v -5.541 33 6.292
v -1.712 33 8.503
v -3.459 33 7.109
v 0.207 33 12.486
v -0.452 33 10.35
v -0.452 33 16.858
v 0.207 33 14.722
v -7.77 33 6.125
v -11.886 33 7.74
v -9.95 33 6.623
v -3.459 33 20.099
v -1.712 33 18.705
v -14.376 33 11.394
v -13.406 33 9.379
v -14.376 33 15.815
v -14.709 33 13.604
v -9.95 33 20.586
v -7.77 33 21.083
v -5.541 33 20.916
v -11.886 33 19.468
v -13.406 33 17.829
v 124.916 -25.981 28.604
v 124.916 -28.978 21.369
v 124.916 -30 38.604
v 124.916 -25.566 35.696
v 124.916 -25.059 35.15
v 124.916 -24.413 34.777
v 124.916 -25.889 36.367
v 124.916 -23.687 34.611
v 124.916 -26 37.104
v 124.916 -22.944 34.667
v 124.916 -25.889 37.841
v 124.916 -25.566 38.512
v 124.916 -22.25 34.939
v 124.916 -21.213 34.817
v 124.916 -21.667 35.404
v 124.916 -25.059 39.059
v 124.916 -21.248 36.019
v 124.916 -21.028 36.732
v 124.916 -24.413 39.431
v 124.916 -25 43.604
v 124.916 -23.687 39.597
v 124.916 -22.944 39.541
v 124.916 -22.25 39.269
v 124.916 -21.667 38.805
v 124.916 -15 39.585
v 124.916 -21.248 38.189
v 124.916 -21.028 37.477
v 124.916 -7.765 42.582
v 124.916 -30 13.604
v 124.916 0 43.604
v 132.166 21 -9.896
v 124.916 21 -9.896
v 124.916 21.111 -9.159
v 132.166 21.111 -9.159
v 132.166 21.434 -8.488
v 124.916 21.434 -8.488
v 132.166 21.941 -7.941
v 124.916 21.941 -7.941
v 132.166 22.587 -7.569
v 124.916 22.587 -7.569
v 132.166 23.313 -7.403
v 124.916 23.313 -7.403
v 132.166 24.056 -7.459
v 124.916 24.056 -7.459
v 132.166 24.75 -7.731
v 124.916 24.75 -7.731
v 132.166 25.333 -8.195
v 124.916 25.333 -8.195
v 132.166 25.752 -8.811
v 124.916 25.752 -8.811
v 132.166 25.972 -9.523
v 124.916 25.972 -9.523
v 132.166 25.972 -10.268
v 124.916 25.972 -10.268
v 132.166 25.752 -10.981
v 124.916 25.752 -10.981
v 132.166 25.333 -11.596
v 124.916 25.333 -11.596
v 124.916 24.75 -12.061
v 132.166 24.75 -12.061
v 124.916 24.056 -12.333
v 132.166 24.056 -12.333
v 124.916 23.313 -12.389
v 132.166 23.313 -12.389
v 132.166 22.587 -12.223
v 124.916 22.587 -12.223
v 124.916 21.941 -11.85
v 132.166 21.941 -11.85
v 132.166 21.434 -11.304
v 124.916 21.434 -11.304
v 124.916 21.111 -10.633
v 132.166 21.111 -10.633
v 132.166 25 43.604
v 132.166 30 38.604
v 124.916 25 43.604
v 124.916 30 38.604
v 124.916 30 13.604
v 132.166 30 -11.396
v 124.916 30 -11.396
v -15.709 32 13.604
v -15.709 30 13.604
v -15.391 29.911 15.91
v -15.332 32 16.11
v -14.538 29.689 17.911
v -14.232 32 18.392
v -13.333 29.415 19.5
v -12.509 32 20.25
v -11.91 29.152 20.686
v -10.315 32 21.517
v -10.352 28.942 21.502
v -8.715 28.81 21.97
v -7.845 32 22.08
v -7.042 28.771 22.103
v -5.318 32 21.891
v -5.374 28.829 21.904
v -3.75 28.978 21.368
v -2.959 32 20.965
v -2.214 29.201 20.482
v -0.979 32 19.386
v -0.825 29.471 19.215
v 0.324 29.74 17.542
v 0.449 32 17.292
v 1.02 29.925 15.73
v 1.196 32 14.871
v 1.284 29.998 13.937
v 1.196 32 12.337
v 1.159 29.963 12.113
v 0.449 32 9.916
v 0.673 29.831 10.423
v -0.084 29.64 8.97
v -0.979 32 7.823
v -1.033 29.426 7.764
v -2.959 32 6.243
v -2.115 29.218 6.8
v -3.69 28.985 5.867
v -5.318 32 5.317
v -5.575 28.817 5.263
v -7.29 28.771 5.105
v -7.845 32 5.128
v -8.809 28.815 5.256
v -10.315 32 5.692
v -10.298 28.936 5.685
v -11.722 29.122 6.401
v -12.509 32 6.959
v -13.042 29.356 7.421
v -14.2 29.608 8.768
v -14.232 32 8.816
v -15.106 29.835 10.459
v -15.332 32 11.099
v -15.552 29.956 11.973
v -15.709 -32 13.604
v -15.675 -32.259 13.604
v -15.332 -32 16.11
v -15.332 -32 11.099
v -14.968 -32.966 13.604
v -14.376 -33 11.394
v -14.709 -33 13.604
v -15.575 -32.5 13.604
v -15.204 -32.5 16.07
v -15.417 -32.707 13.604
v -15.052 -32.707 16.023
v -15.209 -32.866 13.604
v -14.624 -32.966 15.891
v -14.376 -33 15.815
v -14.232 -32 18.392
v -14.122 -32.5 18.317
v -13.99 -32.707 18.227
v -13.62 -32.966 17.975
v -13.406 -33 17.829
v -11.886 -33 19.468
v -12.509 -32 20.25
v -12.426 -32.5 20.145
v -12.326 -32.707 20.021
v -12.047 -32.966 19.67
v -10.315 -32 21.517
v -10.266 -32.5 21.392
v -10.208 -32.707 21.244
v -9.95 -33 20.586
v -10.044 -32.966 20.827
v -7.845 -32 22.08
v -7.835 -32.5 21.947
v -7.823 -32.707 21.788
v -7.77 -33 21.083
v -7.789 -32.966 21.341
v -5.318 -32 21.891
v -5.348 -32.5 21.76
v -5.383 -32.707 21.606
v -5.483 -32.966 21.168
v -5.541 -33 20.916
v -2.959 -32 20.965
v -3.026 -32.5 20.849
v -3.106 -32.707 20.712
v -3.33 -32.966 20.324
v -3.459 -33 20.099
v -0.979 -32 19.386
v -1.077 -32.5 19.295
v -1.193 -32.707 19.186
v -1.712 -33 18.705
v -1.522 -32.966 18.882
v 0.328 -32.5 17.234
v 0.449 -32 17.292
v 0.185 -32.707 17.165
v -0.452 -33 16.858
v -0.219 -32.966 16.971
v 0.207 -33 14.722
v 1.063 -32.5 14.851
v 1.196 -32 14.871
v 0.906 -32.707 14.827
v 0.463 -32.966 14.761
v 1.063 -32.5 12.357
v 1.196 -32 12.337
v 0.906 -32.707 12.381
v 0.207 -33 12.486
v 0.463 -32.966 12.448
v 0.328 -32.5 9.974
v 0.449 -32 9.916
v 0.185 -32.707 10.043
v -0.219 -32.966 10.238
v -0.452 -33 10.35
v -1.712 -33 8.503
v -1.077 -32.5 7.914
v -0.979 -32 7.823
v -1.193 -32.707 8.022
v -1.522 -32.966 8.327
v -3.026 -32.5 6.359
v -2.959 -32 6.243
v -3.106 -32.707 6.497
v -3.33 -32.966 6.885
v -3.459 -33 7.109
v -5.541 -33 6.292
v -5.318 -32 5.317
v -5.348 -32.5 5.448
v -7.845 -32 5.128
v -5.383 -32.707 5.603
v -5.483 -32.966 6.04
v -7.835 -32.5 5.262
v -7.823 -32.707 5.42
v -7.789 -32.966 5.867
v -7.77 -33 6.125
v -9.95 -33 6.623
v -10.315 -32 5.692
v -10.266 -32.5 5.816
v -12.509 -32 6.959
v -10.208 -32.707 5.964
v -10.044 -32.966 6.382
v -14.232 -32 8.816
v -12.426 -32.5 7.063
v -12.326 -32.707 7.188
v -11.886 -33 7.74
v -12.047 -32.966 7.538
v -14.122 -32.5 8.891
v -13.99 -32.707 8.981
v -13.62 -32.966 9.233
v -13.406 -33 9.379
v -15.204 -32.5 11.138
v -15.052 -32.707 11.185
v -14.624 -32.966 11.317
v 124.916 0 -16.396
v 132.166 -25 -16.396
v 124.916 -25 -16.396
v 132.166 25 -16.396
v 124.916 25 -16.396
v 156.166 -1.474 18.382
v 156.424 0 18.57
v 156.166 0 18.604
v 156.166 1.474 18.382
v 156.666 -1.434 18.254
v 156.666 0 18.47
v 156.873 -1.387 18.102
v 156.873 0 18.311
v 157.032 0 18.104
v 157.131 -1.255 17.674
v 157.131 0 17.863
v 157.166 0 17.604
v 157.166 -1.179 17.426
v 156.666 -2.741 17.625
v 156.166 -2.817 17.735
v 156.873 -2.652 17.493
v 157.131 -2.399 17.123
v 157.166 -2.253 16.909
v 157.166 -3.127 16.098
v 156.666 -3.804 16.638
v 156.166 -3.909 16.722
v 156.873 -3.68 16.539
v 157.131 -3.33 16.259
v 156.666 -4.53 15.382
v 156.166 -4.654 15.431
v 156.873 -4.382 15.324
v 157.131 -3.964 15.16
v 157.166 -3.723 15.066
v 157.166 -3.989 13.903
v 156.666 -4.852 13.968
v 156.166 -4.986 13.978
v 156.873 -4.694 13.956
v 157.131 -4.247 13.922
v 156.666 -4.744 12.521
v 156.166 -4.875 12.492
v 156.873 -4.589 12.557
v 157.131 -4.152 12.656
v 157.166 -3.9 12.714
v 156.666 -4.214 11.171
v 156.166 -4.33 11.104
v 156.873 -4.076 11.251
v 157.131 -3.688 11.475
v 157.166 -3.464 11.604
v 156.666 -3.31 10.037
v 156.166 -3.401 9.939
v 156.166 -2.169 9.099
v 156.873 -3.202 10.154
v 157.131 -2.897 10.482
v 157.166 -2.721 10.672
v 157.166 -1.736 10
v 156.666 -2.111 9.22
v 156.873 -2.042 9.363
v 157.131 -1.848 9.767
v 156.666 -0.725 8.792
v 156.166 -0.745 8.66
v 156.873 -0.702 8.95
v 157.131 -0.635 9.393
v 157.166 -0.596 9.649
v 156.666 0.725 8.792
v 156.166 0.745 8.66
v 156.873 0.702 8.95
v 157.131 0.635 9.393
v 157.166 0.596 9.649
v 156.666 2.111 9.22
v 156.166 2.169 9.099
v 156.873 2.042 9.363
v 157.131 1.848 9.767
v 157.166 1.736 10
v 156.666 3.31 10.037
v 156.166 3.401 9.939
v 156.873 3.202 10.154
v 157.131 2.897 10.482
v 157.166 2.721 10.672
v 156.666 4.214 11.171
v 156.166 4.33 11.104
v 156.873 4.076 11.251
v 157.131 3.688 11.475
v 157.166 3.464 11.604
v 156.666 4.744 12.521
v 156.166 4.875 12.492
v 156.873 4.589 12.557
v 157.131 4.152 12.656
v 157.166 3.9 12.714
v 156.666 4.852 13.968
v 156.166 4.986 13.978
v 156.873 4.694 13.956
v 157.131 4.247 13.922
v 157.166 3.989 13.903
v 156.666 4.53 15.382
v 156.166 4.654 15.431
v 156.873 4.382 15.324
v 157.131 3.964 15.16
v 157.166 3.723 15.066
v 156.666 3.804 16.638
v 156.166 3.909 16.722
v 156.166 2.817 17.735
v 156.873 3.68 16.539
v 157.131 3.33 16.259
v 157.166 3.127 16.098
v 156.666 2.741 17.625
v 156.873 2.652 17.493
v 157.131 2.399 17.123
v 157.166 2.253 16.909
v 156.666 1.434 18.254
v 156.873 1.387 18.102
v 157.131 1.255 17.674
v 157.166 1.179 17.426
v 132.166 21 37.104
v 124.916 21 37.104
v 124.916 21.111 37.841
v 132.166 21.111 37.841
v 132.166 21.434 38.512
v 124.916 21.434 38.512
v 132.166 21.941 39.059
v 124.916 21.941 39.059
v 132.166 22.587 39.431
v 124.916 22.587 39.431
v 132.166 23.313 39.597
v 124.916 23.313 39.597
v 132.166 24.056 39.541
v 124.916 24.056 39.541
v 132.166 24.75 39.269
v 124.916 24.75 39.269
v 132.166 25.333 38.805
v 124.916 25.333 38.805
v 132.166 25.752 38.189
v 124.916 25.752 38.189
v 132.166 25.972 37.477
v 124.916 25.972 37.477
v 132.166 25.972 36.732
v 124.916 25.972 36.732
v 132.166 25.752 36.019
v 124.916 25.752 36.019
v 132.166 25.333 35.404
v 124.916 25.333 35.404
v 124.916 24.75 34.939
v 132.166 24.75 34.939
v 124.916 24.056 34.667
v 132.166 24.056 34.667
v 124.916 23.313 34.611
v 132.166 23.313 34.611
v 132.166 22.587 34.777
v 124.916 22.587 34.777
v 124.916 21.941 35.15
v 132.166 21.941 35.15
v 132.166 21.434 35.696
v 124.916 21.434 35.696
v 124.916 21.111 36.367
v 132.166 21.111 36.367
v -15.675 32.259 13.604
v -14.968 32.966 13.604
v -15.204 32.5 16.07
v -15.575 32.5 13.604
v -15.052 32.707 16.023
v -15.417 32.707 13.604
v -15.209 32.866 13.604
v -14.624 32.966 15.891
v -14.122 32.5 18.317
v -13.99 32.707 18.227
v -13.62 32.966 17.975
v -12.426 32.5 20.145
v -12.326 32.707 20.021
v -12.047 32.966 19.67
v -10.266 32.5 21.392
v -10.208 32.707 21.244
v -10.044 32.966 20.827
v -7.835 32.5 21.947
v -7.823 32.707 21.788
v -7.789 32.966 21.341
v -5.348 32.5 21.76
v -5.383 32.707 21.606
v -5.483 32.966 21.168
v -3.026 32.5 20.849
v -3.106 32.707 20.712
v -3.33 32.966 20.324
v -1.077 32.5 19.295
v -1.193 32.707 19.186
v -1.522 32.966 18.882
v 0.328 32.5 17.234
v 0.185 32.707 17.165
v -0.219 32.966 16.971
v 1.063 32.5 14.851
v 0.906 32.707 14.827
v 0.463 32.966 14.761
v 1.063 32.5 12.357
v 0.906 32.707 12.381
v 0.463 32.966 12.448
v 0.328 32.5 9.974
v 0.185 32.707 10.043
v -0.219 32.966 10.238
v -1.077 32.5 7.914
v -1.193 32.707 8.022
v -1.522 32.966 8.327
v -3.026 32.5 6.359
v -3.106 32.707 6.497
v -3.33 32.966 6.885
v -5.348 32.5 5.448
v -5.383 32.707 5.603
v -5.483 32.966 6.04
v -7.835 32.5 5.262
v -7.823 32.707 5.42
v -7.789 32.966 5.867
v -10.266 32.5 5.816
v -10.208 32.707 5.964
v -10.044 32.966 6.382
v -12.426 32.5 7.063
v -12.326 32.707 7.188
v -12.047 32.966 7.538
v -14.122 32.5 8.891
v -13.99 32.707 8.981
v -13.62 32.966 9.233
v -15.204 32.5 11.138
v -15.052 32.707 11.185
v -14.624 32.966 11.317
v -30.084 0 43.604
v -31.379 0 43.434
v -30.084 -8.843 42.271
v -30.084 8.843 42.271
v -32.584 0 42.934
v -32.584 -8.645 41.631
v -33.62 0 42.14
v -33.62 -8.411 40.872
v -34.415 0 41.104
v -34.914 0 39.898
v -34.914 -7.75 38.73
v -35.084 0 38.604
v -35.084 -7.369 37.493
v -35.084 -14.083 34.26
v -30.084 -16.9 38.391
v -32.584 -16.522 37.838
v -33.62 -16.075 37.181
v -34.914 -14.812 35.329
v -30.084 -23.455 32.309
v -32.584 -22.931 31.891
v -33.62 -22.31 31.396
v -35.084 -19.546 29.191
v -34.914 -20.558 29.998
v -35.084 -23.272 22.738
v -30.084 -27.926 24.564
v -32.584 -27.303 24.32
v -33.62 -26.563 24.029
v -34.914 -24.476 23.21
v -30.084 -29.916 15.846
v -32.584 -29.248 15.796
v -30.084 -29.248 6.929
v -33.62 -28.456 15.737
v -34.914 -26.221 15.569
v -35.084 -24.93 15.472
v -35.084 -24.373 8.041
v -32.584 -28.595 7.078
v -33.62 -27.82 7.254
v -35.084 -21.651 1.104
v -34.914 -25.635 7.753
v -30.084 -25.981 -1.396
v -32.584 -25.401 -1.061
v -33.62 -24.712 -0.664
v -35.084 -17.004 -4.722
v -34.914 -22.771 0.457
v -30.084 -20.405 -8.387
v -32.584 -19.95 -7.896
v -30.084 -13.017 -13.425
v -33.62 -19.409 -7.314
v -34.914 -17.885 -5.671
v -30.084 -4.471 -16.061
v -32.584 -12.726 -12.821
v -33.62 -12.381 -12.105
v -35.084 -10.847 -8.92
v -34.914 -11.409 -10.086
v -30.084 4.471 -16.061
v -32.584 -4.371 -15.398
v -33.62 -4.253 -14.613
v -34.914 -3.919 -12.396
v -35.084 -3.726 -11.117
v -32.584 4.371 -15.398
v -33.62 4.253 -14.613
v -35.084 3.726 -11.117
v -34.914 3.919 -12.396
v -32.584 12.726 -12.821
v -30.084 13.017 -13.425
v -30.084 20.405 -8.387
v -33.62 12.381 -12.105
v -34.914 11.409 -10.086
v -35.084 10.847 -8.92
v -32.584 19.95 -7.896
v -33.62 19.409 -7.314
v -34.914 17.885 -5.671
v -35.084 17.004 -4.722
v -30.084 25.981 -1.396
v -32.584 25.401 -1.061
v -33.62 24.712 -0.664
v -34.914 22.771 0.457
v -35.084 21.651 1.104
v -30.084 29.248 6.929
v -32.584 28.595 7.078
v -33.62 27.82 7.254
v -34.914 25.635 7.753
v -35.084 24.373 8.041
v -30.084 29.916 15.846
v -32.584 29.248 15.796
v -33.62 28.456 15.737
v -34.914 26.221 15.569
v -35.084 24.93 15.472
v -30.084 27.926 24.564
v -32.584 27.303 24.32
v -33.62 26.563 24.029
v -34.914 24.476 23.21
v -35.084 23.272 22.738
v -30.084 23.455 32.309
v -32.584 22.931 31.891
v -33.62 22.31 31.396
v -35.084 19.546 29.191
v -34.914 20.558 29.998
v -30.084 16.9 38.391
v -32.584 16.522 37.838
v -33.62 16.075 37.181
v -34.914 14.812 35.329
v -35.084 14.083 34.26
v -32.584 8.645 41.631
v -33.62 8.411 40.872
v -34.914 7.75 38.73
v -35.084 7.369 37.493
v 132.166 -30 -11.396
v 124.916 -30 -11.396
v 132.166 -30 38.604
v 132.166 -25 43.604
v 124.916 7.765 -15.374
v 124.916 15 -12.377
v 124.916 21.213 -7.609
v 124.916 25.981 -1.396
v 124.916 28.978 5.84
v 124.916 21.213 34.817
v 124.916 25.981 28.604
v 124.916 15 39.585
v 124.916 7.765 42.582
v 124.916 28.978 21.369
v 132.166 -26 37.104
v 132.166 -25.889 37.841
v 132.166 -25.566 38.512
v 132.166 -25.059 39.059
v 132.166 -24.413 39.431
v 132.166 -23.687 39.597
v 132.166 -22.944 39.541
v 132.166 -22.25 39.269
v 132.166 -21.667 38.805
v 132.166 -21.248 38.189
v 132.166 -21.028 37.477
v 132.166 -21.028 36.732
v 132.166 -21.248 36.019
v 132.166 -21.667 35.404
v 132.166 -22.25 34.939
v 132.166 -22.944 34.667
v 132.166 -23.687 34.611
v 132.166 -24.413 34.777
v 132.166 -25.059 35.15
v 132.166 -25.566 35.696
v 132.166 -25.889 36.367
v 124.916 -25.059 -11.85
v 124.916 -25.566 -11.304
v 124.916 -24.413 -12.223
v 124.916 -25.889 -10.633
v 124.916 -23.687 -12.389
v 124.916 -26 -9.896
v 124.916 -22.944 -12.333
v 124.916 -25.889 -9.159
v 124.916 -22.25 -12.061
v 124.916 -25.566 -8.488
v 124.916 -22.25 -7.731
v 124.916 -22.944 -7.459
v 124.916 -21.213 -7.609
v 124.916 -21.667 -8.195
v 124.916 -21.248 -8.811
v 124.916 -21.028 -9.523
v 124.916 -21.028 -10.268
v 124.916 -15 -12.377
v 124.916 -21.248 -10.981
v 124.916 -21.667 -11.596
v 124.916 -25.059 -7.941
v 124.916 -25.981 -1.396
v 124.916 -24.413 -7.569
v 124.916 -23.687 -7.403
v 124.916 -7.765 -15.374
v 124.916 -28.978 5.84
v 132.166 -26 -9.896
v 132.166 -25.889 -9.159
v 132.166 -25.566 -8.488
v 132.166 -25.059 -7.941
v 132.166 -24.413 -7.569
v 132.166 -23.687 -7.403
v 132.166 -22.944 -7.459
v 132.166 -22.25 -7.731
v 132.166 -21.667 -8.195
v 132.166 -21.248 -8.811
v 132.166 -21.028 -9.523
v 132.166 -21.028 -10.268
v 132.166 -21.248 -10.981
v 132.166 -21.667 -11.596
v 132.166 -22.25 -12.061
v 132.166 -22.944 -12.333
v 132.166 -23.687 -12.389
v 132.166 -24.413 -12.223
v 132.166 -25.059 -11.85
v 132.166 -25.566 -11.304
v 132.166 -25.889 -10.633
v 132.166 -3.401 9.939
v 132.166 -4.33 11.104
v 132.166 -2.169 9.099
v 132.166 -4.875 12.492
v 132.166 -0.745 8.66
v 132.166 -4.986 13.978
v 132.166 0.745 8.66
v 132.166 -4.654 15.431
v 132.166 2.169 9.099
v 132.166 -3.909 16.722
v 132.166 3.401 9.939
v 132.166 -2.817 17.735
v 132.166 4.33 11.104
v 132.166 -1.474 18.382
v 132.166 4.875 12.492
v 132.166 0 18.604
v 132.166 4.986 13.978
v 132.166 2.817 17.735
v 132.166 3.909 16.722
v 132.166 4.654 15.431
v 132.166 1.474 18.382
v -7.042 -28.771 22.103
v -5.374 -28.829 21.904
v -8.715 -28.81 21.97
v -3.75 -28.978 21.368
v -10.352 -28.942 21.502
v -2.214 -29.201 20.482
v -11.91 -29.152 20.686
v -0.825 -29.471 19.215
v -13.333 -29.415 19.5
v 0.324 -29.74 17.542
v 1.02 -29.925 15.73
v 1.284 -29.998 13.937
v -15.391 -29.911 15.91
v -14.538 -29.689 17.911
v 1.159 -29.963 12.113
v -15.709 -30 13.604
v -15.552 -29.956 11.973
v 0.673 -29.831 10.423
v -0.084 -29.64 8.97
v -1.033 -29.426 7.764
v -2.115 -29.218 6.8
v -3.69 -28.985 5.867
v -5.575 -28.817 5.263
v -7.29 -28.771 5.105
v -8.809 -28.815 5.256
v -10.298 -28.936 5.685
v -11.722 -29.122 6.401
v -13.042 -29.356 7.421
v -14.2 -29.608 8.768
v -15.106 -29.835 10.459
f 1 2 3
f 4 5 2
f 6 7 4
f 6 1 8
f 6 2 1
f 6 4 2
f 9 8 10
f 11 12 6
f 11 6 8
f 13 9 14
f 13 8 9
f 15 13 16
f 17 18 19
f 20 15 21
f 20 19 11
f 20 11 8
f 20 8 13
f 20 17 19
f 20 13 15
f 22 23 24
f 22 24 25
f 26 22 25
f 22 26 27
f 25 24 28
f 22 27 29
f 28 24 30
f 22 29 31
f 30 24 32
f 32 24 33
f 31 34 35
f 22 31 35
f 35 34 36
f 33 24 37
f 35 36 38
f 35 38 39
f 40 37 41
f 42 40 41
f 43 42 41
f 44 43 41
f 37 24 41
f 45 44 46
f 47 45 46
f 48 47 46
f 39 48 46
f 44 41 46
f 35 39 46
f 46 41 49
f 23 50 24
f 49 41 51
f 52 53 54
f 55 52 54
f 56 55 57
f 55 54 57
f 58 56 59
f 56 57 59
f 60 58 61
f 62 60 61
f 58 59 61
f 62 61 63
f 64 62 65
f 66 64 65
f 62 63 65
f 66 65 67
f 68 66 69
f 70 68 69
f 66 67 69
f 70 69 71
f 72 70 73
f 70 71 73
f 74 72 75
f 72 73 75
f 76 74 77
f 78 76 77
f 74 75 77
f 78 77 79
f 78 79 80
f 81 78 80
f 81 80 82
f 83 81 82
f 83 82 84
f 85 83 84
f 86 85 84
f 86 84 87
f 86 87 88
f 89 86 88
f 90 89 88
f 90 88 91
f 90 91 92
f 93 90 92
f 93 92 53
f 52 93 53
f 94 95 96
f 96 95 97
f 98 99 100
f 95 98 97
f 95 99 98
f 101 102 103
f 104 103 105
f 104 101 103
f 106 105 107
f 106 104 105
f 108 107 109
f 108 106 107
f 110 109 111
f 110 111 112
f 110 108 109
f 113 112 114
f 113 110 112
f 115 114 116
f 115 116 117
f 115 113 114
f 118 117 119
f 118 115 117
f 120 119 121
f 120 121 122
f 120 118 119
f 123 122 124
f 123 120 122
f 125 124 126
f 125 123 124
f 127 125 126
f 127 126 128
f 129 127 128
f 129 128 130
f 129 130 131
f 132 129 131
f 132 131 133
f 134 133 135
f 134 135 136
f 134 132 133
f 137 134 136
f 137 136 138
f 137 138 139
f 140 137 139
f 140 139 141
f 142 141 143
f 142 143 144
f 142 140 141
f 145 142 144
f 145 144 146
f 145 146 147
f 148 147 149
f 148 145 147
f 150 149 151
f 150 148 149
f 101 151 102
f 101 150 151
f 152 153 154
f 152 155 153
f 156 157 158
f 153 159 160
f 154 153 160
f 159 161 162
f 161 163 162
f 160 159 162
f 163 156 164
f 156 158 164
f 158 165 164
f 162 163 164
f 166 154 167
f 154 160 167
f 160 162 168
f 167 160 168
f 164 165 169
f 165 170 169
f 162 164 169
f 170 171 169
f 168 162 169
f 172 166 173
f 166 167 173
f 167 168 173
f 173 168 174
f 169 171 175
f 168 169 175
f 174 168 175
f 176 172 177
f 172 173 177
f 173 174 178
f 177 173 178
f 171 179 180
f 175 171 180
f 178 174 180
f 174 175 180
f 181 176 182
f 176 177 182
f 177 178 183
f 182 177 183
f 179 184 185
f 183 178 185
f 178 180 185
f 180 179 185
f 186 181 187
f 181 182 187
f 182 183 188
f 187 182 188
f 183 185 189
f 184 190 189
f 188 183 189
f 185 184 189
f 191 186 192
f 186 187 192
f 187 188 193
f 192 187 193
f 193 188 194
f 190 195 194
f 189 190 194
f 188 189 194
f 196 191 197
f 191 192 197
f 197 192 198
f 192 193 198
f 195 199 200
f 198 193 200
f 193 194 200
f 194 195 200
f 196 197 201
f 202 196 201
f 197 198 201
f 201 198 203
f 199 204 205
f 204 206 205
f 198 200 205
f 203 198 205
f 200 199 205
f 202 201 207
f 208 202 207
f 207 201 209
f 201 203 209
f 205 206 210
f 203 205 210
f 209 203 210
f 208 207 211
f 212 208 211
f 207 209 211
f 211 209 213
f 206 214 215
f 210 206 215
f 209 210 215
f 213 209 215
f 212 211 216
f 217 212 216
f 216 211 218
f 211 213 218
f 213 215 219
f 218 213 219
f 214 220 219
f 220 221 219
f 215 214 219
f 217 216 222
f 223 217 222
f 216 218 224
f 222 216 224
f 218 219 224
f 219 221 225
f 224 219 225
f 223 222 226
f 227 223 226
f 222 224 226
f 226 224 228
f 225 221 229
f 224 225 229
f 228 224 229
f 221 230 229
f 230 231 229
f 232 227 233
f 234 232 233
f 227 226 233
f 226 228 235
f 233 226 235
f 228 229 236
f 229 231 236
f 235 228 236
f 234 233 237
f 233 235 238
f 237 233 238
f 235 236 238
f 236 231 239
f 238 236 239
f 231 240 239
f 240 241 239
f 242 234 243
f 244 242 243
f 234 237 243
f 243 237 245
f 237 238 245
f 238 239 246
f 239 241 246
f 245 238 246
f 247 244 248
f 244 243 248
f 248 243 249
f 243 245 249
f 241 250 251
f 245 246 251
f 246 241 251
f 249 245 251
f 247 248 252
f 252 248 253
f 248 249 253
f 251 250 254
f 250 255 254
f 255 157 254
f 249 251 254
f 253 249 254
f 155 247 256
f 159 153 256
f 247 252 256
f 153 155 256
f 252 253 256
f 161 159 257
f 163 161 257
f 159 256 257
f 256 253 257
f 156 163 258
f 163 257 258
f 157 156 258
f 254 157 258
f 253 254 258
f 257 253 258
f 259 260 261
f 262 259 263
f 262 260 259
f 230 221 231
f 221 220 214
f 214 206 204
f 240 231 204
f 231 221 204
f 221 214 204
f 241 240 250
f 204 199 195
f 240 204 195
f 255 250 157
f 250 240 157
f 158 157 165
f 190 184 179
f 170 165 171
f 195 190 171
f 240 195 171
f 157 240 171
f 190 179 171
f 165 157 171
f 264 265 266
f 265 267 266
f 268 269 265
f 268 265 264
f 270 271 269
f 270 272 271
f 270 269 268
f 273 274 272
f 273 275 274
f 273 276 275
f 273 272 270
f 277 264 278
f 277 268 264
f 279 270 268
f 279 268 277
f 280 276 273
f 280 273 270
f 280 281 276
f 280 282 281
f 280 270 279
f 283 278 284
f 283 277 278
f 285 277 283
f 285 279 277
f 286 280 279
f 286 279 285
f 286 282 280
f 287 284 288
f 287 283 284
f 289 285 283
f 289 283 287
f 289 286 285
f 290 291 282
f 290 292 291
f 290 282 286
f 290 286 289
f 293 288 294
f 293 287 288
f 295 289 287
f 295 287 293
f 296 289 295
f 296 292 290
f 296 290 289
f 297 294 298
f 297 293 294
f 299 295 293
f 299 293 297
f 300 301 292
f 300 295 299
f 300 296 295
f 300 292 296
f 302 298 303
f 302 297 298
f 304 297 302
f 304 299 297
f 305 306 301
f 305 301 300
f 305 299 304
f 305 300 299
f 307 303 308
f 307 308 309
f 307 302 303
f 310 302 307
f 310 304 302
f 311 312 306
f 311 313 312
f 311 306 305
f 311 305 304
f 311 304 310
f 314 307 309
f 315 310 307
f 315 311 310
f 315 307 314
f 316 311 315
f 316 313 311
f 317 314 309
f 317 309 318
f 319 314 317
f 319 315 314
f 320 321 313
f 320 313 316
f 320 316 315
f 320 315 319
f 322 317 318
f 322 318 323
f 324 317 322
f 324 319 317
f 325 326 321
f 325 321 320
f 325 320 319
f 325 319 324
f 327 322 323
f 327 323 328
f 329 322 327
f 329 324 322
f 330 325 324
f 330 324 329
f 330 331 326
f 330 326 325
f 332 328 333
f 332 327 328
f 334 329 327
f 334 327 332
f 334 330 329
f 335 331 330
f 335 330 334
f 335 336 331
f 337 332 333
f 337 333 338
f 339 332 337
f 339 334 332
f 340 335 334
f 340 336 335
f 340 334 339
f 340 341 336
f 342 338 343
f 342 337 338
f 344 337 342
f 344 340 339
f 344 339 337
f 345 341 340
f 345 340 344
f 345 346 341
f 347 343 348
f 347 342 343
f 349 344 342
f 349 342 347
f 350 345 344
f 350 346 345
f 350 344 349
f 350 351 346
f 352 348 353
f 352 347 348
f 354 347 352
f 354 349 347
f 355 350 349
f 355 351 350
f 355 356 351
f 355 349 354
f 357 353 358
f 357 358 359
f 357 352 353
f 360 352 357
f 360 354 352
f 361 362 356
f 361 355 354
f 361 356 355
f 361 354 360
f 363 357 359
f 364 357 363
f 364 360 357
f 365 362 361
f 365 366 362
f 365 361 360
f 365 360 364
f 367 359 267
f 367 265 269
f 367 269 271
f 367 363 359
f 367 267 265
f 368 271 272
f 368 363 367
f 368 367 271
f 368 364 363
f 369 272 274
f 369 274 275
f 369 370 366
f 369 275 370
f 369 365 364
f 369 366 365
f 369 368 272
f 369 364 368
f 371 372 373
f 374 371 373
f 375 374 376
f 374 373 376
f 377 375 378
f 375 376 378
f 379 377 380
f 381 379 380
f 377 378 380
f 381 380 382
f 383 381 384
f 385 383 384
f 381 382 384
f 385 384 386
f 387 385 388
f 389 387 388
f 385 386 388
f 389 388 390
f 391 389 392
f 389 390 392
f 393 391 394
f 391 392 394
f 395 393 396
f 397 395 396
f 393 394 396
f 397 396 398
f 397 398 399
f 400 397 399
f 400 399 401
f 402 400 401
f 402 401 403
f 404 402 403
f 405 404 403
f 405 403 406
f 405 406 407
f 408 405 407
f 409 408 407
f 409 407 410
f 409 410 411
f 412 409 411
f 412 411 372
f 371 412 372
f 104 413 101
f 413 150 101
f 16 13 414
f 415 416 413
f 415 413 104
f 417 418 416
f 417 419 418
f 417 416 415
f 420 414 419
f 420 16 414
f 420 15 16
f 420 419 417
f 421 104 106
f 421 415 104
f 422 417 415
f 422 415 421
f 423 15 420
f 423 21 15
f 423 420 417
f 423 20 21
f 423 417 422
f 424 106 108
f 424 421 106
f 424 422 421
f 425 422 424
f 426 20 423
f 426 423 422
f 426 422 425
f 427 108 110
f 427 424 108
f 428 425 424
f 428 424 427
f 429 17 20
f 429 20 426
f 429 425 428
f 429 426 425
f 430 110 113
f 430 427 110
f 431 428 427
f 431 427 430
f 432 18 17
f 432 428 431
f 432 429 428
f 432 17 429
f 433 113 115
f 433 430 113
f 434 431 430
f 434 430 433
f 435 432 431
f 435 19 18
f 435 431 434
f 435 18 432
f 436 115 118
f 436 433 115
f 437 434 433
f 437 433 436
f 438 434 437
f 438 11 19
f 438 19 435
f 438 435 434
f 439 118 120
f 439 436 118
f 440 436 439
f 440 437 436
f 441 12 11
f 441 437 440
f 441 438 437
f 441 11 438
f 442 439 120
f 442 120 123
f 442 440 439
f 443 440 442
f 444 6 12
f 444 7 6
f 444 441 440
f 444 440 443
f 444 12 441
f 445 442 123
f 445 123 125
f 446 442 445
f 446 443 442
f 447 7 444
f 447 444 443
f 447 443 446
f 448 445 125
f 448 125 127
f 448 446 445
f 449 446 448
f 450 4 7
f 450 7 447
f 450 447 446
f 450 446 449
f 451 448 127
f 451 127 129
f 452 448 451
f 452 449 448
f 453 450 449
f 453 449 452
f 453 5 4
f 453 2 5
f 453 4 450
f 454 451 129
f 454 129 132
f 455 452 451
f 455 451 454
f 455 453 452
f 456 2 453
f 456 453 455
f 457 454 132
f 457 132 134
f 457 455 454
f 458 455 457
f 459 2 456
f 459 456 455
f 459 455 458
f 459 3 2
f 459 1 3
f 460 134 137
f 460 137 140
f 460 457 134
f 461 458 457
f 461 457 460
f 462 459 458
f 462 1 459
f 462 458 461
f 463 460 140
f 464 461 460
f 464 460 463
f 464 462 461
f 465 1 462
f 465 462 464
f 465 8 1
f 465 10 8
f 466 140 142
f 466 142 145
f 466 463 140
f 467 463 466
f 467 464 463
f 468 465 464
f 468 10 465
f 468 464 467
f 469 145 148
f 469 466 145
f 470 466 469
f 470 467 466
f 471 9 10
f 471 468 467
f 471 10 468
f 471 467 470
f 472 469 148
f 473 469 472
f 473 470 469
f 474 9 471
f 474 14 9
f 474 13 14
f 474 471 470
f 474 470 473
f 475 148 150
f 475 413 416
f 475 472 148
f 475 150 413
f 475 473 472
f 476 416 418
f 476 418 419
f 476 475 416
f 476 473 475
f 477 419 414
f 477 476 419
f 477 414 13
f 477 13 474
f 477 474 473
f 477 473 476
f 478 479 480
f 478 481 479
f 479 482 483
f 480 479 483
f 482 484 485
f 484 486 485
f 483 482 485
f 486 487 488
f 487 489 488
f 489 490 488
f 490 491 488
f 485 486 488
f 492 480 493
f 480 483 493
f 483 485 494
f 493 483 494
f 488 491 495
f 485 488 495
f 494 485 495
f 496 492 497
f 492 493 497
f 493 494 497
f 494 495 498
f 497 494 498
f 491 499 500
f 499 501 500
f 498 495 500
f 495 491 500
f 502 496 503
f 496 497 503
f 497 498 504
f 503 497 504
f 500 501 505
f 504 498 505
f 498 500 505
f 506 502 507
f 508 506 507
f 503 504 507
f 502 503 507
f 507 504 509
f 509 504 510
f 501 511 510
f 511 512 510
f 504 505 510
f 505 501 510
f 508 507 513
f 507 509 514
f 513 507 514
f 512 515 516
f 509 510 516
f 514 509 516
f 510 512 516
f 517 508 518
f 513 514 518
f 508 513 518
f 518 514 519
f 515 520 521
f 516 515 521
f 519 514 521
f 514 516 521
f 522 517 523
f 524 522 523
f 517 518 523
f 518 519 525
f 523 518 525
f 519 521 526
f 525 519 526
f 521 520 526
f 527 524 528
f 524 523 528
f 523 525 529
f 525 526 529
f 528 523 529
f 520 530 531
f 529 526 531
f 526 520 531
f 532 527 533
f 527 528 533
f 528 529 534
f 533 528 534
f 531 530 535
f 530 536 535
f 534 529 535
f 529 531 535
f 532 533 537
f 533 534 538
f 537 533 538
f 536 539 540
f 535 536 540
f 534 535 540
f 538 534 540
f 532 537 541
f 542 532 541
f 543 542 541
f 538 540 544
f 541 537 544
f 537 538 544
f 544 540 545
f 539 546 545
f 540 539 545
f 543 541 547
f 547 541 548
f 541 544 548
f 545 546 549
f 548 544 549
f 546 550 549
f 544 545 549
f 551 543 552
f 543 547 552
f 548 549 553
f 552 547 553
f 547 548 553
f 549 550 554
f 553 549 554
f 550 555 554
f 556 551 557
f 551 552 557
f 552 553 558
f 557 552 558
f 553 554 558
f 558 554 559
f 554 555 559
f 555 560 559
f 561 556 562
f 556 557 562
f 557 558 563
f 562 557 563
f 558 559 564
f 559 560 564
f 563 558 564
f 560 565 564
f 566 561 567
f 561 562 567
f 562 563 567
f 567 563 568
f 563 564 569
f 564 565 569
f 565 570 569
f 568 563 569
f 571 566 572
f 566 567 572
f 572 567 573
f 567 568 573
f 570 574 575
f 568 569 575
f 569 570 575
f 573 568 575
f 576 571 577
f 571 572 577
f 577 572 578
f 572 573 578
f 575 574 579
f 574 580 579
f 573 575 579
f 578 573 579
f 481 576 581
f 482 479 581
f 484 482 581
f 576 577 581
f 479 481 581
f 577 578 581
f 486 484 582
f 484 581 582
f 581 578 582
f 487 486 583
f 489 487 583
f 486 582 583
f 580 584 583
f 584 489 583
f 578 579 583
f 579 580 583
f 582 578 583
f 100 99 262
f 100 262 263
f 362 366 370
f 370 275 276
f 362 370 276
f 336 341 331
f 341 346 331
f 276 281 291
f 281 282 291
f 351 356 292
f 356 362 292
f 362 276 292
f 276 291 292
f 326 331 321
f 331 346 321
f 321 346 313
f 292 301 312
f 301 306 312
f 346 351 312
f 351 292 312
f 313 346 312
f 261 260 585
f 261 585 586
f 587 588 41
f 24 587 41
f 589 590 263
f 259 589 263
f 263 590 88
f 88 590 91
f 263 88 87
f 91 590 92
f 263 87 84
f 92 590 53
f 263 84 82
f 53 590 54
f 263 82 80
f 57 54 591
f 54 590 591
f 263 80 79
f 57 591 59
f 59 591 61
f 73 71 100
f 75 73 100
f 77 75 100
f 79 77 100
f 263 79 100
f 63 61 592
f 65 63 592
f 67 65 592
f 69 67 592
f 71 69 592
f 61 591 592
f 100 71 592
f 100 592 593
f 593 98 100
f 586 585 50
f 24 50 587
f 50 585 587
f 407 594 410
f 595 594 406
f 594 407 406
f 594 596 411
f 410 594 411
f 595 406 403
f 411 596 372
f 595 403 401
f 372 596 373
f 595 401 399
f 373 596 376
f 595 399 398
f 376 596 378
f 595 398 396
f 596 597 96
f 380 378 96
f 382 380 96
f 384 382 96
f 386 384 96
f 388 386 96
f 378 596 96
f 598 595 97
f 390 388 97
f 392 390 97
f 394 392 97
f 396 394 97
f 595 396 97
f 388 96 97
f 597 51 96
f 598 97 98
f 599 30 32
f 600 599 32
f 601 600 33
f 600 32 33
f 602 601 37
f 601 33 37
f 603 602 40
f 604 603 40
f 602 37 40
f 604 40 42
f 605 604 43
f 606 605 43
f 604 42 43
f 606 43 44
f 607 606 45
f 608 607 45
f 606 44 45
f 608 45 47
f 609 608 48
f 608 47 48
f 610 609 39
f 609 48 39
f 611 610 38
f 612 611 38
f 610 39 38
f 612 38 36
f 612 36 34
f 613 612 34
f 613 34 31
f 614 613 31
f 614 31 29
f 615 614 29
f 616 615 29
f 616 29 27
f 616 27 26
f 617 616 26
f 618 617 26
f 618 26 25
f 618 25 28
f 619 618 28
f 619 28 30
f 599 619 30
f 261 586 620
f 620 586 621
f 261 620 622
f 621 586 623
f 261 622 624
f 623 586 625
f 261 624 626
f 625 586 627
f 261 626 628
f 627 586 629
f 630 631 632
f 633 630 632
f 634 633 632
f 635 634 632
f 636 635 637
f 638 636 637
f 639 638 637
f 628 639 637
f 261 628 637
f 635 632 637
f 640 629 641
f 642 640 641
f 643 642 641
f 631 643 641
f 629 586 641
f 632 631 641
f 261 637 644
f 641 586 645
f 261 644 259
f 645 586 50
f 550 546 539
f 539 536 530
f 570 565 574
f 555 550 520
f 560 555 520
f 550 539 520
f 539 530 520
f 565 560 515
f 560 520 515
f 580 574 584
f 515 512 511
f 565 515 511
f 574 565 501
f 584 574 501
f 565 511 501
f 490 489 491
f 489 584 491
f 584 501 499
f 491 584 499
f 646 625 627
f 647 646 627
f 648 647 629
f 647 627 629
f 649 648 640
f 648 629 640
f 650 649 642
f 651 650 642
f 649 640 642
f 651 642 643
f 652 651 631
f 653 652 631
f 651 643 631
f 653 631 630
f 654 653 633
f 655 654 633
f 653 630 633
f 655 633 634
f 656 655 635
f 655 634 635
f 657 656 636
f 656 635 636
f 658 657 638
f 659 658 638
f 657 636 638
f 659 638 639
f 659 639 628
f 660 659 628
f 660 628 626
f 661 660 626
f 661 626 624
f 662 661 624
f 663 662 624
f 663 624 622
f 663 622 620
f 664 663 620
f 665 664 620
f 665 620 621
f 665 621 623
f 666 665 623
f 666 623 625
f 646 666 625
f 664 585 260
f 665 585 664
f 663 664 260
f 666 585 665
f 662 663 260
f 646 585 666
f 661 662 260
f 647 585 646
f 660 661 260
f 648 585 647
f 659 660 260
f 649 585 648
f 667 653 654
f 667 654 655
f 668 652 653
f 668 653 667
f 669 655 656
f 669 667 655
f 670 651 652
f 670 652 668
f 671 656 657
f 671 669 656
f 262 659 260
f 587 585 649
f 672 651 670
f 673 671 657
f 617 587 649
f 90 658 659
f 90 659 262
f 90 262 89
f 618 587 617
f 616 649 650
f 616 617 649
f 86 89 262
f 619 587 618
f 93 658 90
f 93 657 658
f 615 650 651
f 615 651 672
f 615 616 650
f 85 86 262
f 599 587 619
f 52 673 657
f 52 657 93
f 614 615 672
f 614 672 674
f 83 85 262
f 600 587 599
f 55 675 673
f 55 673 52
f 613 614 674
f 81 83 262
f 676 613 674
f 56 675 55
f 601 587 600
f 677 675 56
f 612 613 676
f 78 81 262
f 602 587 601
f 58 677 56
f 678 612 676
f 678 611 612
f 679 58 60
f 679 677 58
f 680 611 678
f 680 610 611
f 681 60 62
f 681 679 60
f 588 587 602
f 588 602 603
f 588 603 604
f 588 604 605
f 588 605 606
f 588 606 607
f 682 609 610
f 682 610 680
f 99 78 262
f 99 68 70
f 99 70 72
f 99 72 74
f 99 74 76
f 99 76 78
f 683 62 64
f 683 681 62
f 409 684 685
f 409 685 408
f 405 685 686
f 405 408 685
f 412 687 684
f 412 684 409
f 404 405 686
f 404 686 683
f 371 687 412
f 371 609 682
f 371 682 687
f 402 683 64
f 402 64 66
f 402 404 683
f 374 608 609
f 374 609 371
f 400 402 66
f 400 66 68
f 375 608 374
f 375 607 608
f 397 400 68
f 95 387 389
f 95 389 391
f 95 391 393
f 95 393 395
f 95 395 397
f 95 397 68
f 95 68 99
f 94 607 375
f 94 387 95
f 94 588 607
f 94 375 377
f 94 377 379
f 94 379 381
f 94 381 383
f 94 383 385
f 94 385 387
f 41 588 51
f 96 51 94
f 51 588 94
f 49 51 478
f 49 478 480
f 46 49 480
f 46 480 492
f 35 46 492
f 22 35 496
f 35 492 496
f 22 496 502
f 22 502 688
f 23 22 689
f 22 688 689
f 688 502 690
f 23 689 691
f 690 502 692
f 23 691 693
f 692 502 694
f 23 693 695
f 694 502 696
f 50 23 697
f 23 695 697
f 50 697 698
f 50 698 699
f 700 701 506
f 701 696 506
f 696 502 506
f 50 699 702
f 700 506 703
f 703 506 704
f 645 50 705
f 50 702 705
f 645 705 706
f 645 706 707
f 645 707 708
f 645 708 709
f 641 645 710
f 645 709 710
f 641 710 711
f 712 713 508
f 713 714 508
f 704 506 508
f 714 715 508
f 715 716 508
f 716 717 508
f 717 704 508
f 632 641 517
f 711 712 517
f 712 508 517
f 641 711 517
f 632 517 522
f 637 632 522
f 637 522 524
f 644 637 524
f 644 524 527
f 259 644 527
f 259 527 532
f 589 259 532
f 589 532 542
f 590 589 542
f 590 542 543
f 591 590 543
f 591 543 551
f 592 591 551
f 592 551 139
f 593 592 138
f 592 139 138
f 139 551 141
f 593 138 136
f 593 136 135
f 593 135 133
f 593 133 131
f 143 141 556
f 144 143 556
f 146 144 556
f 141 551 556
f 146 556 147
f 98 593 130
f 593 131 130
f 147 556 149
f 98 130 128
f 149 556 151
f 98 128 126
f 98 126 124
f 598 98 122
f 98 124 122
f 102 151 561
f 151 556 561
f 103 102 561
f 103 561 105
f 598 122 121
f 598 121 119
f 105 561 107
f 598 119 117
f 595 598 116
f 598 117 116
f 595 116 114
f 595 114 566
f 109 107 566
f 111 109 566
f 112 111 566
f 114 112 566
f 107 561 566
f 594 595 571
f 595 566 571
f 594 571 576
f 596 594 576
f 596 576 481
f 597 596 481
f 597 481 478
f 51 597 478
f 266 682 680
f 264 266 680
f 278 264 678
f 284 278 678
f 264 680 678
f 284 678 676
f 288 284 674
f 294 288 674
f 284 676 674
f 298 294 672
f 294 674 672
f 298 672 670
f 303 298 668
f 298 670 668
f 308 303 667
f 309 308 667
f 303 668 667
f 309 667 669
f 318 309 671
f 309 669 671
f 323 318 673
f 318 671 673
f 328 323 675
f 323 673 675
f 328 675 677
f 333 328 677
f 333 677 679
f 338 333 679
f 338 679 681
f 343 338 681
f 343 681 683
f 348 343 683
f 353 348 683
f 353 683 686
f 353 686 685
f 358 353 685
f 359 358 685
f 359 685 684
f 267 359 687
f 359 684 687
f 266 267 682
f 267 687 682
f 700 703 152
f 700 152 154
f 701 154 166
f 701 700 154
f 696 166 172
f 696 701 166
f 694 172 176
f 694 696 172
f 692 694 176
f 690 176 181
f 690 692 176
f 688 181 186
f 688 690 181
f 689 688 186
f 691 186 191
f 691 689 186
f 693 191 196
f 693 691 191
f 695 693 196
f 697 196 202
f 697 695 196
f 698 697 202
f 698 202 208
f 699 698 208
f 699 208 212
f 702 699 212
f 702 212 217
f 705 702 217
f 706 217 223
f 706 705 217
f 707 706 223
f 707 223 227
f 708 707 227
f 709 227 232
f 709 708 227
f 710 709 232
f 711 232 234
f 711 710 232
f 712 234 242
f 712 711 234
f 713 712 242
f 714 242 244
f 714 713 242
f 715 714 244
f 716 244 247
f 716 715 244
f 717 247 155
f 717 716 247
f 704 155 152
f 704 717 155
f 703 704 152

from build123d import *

# Parameters (mm, degrees)
F2_W      = 60
F2_H      = 60
F3_DEPTH  = 7.25
F5_D      = 5
F6_SIZE   = 5
F7_R      = 5
F8_R      = 1
F10_R     = 8.5
F11_DEPTH = 33
F12_R     = 1


with BuildPart() as f1:
    # F0 (on Front) → F1 (revolve)
    with BuildSketch(Plane.XZ):
        Polygon((-35.0844461756, 13.6041676658), (157.1655538244, 13.6041676658), (157.1655538244, 18.6041676658), (132.1655538244, 18.6041676658), (132.1655538244, 43.6041676658), (-35.0844461756, 43.6041676658), align=None)
    revolve(axis=Axis((57.2006537472, 0, 13.6041676658), (1, 0, 0)))

    # F2 (on face) → F3 (join)
    with BuildSketch(Plane.YZ.offset(132.1655538244)):
        with Locations((0, 13.6041676658)):
            Rectangle(F2_W, F2_H)
    extrude(amount=-F3_DEPTH)

    # F5 (through all)
    with Locations(Plane.YZ.offset(132.1655538244)):
        with Locations((-23.5, 37.1041676658), (23.5, 37.1041676658), (-23.5, -9.8958323342), (23.5, -9.8958323342)):
            Hole(F5_D / 2)

    # F6
    f6_edges = [f1.edges().sort_by_distance(p)[0] for p in [
        (128.540554, 30, 43.604168),
        (128.540554, 30, -16.395832),
        (128.540554, -30, 43.604168),
        (128.540554, -30, -16.395832),
    ]]
    chamfer(f6_edges, length=F6_SIZE)

    # F7
    f7_edges = [f1.edges().sort_by_distance(p)[0] for p in [
        (-35.084446, 0, -16.395832),
    ]]
    fillet(f7_edges, radius=F7_R)

    # F8
    f8_edges = [f1.edges().sort_by_distance(p)[0] for p in [
        (157.165554, 0, 8.604168),
    ]]
    fillet(f8_edges, radius=F8_R)

    # F10 (on offset) → F11 (join, symmetric)
    with BuildSketch(Plane(origin=(0, 0, 0), x_dir=(-1, 0, 0), z_dir=(0, 1, 0))):
        with Locations((7.2094461756, 13.6041676658)):
            Circle(F10_R)
    extrude(amount=F11_DEPTH, both=True)

    # F12
    f12_edges = [f1.edges().sort_by_distance(p)[0] for p in [
        (1.290554, -33, 13.604168),
        (1.290554, 33, 13.604168),
    ]]
    fillet(f12_edges, radius=F12_R)


solid = f1.part
